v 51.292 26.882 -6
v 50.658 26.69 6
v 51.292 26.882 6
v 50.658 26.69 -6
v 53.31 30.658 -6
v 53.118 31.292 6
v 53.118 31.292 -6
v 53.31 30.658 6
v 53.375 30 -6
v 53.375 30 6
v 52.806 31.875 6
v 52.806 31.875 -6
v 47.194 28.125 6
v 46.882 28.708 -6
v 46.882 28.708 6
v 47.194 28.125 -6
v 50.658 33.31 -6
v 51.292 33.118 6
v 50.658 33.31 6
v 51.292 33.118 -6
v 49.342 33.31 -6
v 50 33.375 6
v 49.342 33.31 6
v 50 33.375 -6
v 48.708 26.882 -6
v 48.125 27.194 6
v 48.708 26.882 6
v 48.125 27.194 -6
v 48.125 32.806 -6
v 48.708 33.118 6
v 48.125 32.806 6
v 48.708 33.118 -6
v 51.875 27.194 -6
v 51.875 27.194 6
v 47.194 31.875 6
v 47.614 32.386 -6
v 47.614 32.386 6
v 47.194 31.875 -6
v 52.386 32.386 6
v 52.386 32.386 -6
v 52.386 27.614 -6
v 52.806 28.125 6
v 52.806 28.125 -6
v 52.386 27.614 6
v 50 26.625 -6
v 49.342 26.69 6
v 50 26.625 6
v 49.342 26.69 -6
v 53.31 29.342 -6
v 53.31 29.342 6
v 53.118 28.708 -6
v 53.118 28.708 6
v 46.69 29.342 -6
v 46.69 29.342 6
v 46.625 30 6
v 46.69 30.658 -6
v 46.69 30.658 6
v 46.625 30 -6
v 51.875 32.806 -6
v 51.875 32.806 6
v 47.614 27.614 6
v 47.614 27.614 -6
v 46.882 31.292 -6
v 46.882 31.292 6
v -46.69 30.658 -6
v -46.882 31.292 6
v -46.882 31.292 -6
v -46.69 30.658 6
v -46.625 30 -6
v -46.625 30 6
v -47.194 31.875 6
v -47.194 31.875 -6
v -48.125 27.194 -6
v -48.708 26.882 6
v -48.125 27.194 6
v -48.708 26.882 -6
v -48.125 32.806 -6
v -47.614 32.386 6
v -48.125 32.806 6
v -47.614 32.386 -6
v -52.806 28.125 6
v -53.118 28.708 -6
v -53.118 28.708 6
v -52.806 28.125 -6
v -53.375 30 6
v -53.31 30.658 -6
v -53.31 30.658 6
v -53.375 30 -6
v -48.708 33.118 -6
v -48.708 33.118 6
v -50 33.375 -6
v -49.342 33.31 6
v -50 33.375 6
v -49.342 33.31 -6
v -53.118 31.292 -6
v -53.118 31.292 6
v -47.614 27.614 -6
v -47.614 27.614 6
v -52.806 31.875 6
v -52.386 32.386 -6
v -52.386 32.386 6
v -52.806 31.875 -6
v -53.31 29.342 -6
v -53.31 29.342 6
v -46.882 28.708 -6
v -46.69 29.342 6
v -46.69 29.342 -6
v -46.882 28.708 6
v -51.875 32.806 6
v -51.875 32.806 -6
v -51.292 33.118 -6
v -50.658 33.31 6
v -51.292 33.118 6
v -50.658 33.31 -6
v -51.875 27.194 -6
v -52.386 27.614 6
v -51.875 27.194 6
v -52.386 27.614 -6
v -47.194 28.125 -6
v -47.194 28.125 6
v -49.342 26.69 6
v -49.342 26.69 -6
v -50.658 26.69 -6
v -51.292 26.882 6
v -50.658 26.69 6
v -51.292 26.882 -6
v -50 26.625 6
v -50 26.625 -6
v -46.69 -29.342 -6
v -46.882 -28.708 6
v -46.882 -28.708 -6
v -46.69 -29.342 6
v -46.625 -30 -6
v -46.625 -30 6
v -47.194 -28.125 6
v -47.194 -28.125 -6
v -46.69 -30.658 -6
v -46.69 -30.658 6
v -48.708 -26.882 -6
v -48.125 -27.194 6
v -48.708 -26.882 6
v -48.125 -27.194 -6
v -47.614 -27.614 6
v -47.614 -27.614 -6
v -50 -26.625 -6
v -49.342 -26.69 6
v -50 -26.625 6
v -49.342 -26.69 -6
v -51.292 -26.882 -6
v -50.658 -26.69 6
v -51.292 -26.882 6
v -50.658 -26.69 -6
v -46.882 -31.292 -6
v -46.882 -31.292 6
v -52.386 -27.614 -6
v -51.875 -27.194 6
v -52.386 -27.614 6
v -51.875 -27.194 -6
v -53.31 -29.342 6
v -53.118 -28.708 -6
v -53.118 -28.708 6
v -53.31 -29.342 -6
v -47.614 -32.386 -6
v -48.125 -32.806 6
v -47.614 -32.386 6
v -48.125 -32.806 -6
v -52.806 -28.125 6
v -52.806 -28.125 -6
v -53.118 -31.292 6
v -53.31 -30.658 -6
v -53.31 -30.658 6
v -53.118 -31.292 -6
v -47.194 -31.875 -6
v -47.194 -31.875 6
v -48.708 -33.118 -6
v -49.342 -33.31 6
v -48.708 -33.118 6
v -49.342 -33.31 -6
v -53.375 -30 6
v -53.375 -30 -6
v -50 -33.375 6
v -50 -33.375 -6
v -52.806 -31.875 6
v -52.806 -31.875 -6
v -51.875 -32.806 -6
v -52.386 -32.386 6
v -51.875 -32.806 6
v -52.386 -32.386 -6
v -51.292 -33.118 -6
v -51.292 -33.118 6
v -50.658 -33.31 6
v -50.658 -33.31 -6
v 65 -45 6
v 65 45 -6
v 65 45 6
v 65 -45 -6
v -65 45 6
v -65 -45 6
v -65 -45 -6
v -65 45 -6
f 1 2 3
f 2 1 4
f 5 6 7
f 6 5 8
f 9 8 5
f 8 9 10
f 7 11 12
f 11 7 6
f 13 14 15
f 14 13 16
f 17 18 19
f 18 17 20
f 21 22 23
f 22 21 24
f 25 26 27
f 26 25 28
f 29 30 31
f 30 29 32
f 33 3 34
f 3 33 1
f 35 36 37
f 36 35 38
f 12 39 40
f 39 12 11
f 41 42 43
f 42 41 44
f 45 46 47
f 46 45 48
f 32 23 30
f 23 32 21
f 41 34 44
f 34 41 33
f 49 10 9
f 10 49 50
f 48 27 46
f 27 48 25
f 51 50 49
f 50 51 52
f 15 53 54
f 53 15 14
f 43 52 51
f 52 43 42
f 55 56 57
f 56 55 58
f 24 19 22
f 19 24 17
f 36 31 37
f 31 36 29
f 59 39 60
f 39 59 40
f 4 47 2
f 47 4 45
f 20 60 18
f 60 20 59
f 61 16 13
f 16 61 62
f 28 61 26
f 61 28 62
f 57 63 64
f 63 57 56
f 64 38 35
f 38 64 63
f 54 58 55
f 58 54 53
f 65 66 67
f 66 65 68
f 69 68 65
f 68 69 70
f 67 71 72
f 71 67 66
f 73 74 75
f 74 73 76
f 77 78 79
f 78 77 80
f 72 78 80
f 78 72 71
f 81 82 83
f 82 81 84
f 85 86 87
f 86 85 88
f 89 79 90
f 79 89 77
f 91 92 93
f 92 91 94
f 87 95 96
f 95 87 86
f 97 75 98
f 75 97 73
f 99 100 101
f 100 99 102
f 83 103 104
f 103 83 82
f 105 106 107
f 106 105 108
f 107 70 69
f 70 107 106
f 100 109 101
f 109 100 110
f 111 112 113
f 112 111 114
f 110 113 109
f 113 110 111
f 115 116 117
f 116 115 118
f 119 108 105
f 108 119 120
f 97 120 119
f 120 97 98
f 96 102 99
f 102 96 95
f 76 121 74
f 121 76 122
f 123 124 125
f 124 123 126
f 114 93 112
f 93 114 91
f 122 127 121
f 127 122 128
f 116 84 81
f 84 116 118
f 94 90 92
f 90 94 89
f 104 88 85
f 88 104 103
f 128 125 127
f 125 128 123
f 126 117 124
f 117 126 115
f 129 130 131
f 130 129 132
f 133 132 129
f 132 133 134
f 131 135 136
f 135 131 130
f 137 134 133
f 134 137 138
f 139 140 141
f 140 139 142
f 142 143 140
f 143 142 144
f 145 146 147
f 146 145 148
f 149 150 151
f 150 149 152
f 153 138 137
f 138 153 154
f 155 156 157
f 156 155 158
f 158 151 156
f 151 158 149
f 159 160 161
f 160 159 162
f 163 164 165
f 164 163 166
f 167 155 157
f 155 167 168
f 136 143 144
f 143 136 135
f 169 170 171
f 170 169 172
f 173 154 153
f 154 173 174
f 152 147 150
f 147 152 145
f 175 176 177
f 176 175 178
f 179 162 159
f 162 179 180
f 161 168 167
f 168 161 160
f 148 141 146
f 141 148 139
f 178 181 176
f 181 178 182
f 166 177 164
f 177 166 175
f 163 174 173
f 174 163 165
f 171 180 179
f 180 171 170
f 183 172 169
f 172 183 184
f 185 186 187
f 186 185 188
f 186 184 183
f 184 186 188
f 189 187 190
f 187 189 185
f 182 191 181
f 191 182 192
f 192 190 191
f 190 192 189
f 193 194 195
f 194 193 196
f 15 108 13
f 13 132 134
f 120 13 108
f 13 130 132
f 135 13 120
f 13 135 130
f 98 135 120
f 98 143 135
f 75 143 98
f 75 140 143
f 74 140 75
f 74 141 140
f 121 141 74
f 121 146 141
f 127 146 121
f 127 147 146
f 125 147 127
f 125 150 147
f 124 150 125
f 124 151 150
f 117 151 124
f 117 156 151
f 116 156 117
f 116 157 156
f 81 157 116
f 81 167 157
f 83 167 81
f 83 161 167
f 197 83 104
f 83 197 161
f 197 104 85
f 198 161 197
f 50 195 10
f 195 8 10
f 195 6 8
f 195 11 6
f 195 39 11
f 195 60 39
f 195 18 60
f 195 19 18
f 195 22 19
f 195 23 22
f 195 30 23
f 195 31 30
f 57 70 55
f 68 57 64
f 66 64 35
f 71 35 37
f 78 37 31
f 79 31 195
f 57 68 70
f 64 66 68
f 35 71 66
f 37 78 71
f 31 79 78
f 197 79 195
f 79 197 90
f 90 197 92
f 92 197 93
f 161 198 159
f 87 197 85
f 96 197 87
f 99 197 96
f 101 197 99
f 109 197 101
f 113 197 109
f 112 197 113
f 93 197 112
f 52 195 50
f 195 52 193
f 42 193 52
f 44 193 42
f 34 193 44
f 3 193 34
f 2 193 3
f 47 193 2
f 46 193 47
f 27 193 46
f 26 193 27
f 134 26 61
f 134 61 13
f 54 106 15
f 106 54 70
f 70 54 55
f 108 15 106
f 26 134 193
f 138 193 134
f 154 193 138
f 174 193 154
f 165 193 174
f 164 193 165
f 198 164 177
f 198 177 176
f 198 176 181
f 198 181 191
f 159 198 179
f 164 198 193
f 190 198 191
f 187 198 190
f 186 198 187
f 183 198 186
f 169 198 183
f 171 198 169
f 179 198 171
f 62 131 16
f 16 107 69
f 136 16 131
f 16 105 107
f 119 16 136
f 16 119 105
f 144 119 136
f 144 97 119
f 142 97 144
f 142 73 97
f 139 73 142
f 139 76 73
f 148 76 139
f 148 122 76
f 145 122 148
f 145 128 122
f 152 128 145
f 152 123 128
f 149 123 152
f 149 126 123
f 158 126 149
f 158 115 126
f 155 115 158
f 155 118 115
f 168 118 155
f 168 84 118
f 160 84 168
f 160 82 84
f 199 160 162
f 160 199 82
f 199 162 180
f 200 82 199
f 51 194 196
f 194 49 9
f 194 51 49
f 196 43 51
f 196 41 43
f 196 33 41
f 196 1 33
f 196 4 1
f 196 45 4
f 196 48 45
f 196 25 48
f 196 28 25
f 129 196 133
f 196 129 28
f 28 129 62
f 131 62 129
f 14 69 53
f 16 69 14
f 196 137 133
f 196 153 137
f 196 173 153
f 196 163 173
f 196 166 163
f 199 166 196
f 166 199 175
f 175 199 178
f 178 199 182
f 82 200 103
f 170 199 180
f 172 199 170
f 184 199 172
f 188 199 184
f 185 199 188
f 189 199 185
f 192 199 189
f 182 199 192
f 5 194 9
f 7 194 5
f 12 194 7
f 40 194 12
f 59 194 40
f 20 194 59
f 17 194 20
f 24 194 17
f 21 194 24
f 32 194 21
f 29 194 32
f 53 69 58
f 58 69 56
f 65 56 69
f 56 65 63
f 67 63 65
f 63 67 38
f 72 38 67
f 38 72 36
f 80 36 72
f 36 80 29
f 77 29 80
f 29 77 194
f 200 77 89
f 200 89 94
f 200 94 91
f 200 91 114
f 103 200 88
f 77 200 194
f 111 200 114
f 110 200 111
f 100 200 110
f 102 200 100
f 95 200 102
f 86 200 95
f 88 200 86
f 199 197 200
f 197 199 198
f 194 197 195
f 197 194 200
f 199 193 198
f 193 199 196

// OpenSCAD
$fn = 32;

// ----------------------------------------------------------------------
// Corner plate 130 x 90 x 12
// 3 holes, centres taken from the edge offset
// ----------------------------------------------------------------------

// --- parameters (mm) ---
plate = [130, 90, 12];   // overall size (x, y, z)
holes = 3;               // number of holes the drawing asks for
bore_d = 6.6;            // nominal hole diameter from the drawing
print_allowance = 0.15;  // clearance added for printing
edge = 15;               // hole centre offset from the plate edge

// --- derived feature positions (mm) ---
hole_d = bore_d + print_allowance;  // = 6.75   hole diameter as printed
corner_x = plate[0] / 2 - edge;     // = 50   corner hole X
corner_y = plate[1] / 2 - edge;     // = 30   corner hole Y
feature_centers = [
  [corner_x, corner_y],
  [-corner_x, corner_y],
  [-corner_x, -corner_y]
];   // hole centres the loop below drills

// plate outline, every hole drilled through with the same cutters
difference() {
  cube(plate, center = true);
  for (centre = feature_centers)
    translate([centre[0], centre[1], 0])
      cylinder(d = hole_d, h = plate[2] + 2, center = true);
}
